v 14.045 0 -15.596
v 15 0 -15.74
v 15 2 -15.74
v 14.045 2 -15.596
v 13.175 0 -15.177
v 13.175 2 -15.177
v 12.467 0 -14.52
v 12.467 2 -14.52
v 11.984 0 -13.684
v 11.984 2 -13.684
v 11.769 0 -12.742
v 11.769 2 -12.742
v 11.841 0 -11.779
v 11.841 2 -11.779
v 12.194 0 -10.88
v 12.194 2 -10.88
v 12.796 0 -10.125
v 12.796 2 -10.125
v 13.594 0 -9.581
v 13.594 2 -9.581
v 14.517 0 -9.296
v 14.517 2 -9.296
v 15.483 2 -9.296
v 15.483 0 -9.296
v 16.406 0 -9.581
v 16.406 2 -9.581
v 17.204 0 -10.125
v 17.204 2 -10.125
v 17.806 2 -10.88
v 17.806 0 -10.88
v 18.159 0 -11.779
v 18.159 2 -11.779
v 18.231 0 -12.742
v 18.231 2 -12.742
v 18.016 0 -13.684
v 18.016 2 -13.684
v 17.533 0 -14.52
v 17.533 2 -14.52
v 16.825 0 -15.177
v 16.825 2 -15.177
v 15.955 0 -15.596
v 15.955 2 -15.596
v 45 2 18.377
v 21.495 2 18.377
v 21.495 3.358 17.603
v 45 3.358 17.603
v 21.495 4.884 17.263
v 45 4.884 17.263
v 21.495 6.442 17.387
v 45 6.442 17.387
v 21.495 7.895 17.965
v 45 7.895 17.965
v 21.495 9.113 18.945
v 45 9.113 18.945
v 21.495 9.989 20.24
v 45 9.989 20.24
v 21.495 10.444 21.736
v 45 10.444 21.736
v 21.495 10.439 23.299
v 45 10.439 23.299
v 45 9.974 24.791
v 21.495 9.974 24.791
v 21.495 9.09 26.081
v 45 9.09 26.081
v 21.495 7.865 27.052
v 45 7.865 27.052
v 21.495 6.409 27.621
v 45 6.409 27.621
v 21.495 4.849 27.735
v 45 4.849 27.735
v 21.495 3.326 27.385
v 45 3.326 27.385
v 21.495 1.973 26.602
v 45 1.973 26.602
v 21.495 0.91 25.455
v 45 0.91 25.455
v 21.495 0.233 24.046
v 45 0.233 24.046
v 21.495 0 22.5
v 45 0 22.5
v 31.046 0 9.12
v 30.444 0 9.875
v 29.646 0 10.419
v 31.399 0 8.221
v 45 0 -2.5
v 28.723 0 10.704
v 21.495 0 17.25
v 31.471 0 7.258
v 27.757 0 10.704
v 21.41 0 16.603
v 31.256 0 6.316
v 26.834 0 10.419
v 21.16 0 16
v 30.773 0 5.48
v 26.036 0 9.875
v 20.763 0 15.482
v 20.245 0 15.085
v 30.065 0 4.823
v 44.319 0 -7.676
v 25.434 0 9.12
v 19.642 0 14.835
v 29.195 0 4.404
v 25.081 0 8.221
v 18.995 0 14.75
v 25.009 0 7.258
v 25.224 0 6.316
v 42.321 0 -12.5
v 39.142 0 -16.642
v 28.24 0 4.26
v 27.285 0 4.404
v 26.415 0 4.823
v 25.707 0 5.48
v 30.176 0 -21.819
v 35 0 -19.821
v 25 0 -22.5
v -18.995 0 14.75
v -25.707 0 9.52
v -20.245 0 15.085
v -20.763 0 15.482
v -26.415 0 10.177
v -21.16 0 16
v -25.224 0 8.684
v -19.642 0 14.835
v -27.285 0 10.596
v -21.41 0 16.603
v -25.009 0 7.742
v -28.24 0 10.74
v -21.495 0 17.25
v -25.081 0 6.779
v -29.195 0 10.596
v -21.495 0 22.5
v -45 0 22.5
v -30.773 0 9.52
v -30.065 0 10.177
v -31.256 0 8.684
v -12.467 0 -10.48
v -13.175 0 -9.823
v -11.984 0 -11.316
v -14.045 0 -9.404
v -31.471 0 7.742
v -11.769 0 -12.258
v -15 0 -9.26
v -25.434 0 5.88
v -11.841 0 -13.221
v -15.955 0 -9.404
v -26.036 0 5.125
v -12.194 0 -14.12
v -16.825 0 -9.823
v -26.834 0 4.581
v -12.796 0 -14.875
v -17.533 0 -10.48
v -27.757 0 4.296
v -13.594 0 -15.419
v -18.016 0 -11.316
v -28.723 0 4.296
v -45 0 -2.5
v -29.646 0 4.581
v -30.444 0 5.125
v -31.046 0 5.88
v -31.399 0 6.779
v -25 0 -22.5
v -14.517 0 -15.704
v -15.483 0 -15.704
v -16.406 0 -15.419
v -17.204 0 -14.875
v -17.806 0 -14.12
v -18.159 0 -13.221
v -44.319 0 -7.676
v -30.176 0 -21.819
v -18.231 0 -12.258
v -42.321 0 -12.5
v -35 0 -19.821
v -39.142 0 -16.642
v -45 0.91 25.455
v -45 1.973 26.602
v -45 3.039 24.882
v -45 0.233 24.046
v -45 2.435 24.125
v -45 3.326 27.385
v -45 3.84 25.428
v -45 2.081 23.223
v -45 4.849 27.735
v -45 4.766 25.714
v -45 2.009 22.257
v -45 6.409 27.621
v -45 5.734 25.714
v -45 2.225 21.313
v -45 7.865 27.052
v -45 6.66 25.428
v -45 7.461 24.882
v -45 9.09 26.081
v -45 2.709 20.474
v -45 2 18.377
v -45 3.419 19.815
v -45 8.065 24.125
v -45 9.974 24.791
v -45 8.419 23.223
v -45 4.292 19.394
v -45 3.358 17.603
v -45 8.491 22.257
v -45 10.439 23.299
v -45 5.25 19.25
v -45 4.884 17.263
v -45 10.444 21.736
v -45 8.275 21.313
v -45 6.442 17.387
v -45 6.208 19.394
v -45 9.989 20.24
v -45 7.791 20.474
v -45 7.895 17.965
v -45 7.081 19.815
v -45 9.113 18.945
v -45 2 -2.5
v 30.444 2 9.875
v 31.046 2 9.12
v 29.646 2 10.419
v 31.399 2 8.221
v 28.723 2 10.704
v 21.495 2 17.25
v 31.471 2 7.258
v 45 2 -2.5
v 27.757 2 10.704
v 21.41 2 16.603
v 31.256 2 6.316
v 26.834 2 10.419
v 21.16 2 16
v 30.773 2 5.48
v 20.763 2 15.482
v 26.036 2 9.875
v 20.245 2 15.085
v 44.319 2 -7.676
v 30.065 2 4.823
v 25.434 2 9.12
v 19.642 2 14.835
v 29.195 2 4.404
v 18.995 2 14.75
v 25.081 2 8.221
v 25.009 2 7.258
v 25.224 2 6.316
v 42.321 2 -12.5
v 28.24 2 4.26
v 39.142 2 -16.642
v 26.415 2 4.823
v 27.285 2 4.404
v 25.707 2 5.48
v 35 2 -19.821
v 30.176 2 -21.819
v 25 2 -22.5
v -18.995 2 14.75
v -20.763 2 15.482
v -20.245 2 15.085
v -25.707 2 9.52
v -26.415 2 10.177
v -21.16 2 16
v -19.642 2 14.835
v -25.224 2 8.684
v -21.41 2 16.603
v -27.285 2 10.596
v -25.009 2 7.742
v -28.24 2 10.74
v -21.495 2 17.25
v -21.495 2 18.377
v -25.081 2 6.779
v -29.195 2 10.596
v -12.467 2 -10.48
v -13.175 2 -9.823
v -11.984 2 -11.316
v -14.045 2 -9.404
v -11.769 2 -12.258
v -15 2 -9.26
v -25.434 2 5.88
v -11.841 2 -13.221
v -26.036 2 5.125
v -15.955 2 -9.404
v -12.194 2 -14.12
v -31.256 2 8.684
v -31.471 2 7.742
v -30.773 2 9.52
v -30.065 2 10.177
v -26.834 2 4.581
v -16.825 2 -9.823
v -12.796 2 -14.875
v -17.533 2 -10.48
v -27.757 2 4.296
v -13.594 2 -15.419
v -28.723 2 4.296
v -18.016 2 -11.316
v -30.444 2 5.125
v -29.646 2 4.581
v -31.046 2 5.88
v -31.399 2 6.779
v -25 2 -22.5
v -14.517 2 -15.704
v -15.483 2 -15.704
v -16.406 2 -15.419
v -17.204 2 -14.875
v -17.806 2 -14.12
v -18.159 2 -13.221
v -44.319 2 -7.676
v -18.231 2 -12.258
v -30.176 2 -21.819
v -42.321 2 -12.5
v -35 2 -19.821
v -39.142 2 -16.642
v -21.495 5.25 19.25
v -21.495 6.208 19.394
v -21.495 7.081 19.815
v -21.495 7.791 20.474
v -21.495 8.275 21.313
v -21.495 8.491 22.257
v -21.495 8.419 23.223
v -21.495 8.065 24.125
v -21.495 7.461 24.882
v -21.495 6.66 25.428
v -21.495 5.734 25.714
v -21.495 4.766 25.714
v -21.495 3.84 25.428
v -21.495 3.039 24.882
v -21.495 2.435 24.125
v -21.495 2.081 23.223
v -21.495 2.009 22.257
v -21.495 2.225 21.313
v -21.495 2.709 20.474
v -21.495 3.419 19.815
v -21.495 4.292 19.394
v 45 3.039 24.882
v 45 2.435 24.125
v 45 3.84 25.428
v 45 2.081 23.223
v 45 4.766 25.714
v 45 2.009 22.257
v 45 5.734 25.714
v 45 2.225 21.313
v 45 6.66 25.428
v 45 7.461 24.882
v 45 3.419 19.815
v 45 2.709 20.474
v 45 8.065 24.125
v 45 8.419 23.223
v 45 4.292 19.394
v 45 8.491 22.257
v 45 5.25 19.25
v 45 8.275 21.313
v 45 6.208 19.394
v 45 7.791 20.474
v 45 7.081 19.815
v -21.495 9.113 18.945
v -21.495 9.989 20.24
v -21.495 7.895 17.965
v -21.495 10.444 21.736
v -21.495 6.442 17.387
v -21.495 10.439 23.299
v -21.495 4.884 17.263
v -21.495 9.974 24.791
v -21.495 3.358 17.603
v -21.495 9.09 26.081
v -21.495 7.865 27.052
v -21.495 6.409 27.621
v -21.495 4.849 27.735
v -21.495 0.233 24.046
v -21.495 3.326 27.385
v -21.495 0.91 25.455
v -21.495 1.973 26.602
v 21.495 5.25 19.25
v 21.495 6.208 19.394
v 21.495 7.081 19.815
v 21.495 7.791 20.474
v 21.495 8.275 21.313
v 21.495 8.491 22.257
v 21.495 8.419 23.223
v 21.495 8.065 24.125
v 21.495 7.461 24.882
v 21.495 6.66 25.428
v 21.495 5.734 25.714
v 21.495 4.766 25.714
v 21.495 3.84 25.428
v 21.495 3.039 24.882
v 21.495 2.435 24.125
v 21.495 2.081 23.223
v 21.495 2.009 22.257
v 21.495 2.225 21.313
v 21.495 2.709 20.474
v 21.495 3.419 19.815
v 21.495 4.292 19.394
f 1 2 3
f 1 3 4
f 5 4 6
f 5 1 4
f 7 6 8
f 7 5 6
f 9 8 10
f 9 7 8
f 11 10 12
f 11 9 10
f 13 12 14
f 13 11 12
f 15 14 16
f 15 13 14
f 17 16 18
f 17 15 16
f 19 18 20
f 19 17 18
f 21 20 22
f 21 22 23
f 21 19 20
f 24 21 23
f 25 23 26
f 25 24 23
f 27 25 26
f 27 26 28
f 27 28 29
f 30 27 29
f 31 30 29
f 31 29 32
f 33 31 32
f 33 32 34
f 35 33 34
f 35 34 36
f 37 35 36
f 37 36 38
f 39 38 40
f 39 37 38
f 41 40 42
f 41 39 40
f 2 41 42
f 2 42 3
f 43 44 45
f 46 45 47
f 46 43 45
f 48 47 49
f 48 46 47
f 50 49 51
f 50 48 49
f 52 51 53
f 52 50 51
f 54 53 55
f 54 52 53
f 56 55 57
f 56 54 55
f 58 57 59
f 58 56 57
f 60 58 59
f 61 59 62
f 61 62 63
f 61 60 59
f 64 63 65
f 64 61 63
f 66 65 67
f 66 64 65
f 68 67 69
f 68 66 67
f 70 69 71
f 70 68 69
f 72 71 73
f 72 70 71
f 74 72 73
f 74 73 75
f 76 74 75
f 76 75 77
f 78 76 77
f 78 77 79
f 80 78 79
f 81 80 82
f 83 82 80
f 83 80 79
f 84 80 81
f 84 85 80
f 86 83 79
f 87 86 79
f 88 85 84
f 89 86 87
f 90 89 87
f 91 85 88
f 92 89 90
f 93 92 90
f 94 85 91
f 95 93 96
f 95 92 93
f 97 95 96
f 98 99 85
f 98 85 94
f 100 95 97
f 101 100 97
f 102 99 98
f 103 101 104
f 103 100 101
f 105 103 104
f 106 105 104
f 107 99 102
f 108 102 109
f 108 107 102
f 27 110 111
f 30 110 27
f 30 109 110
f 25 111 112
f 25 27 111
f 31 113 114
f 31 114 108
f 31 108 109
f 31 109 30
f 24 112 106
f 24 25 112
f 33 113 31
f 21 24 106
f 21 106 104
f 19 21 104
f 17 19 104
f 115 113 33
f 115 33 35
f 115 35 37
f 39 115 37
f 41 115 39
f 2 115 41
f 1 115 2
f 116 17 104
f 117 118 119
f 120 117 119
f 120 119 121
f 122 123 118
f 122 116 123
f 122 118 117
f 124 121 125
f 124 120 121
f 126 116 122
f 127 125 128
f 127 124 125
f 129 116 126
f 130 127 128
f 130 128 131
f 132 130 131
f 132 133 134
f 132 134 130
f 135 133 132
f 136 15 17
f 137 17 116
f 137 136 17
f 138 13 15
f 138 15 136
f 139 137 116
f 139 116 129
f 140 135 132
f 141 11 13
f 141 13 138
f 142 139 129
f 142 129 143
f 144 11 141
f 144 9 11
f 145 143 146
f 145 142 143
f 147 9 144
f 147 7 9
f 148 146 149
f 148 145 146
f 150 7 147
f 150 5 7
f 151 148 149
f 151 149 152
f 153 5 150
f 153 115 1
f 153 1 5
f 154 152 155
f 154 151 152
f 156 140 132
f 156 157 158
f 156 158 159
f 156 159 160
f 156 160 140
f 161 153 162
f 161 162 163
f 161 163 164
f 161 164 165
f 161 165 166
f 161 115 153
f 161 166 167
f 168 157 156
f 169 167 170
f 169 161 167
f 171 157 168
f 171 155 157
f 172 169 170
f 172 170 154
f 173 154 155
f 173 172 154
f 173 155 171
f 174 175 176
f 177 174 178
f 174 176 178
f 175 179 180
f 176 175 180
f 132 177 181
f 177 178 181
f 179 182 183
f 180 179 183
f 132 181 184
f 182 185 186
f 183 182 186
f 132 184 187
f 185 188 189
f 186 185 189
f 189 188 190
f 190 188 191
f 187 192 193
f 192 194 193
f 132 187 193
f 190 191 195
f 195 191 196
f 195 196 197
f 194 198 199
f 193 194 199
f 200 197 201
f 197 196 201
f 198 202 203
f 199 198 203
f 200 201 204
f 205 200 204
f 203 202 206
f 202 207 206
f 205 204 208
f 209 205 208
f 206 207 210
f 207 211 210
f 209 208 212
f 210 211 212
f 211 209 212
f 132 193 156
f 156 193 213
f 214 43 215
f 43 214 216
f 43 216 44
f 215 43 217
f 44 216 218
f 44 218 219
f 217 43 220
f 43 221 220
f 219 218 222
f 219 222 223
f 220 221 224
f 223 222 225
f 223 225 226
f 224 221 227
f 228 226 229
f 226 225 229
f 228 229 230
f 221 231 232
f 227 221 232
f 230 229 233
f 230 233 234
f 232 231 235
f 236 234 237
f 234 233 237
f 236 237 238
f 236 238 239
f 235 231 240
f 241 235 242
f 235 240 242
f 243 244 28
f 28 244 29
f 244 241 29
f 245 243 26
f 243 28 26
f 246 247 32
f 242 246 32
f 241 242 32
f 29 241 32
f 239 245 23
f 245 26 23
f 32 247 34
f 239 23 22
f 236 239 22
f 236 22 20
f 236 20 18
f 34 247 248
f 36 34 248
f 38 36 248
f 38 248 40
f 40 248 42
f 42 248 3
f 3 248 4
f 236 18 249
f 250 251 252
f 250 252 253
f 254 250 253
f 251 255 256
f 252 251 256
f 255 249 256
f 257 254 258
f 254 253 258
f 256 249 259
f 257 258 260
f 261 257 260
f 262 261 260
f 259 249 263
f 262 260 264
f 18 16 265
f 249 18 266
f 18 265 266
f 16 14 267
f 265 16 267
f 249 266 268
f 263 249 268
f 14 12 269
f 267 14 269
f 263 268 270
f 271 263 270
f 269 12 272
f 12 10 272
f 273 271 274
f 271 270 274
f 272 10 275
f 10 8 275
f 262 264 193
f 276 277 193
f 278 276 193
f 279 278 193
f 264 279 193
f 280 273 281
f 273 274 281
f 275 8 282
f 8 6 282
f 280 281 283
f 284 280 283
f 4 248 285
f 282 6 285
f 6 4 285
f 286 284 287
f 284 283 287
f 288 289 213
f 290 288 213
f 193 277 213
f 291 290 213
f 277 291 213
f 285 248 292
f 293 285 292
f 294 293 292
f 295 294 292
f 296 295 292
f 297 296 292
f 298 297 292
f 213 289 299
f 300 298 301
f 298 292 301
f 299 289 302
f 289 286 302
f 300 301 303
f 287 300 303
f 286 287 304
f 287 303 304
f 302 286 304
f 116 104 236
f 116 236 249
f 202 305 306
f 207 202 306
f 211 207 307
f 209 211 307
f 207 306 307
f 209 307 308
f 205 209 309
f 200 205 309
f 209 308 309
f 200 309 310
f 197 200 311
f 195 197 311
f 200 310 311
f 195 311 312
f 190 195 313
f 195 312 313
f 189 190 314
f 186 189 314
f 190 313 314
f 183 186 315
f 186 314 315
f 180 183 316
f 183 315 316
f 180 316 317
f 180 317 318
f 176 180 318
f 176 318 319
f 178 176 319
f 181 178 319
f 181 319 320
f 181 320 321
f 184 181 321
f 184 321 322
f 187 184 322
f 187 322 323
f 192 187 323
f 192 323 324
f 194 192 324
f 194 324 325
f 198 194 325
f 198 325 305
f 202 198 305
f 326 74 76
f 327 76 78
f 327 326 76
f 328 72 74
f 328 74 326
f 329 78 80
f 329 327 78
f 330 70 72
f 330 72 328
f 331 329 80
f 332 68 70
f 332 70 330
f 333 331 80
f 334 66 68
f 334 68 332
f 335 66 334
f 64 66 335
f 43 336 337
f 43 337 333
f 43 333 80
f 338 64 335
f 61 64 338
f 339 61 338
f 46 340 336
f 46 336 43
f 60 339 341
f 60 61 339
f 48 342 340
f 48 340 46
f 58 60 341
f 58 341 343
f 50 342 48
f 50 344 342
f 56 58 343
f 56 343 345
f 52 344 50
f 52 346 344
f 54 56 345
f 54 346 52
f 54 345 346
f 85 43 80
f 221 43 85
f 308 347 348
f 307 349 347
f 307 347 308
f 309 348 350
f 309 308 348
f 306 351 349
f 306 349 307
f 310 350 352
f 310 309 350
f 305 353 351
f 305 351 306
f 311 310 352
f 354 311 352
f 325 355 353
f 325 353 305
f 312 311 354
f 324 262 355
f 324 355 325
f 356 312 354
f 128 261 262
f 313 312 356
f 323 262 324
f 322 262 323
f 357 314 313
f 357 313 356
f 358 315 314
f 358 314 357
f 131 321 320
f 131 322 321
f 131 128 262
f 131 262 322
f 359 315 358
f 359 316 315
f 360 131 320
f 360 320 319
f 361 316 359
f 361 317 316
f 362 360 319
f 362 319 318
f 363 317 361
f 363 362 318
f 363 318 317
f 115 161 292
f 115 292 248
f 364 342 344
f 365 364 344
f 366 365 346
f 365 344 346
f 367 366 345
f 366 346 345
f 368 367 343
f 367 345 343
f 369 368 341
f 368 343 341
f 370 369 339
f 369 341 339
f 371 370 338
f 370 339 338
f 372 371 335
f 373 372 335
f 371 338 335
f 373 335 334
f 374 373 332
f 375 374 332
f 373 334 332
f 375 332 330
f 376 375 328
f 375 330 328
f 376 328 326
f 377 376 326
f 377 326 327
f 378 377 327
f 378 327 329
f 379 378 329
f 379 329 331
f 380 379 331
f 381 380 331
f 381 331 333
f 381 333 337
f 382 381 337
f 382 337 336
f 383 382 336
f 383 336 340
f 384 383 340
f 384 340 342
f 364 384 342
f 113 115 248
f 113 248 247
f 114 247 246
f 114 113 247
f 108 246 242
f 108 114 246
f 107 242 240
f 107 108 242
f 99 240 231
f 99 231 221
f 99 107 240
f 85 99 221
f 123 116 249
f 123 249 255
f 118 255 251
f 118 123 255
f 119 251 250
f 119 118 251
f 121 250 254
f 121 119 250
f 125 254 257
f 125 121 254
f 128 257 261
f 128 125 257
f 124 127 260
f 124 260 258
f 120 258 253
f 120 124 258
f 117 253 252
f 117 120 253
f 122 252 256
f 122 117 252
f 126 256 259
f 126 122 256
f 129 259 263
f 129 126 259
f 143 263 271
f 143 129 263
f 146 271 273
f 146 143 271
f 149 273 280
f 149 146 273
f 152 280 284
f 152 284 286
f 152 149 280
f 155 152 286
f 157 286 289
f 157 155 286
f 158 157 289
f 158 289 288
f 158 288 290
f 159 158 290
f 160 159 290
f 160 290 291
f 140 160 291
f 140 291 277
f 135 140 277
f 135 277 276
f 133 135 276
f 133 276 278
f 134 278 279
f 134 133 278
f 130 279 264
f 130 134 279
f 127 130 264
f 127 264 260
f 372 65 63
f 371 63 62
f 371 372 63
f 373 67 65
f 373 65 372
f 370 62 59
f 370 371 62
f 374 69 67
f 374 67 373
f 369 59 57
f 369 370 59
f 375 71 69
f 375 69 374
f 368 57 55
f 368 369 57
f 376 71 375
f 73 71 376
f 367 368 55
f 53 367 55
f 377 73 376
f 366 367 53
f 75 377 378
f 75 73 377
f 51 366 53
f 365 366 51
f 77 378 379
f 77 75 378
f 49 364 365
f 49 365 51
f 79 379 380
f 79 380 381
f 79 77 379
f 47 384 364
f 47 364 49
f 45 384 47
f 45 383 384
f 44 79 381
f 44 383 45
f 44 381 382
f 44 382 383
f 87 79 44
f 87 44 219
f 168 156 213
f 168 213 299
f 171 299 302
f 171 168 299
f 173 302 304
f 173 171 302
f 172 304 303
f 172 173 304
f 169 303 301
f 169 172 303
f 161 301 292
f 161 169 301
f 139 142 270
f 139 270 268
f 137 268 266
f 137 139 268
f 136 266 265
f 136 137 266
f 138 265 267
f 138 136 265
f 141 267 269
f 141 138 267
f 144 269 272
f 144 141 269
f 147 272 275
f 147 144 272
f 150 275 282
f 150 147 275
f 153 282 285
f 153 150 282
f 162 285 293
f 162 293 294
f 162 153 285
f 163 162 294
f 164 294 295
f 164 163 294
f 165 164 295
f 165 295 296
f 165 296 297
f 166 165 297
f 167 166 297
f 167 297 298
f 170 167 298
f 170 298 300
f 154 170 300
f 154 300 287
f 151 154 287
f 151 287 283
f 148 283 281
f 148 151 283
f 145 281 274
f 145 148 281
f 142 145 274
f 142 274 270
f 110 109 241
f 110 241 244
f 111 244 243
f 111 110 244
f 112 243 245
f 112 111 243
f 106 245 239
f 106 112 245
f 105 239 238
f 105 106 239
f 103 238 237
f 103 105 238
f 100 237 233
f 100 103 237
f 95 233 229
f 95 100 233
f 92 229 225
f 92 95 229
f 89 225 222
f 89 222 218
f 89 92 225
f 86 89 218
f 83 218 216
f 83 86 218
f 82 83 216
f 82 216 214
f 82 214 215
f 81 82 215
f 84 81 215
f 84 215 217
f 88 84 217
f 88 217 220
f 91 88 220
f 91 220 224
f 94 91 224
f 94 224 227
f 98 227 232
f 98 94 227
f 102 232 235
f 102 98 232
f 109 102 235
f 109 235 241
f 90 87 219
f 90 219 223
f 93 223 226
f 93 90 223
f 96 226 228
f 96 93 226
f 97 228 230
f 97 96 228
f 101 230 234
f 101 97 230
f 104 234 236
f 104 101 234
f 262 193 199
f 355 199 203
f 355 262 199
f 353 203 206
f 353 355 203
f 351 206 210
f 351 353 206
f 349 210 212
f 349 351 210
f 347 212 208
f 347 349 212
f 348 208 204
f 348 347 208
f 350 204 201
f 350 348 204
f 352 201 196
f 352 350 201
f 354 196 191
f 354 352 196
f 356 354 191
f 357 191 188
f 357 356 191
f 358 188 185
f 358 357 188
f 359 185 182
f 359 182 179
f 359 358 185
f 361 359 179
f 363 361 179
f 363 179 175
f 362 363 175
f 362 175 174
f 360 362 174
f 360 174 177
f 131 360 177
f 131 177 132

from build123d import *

# Parameters (mm, degrees)
SKETCH_1_R               = 3.24
EXTRUDE_1_DEPTH          = 2
SKETCH_2_R               = 5.25
SKETCH_2_R_2             = 3.25
EXTRUDE_2_DEPTH          = 90
CUT_EXTRUDE_1_DEPTH      = 54.547292182
CUT_EXTRUDE_1_DEPTH_BACK = 54.547292182


with BuildPart() as part:
    # Эскиз1 → Бобышка-Вытянуть1 (new body)
    with BuildSketch(Plane(origin=(0, 0, 0), x_dir=(1, 0, 0), z_dir=(0, 1, 0))):
        with BuildLine():
            Line((-25, 22.5), (25, 22.5))
            ThreePointArc((25, 22.5), (39.142135624, 16.642135624), (45, 2.5))
            Line((45, 2.5), (45, -22.5))
            Line((45, -22.5), (-45, -22.5))
            Line((-45, -22.5), (-45, 2.5))
            ThreePointArc((-45, 2.5), (-39.142135624, 16.642135624), (-25, 22.5))
        make_face()
        with Locations(Location((-28.24, -7.5, 0), (0, 0, 270))):
            Circle(SKETCH_1_R, mode=Mode.SUBTRACT)
        with Locations(Location((-15, 12.5, 0), (0, 0, 270))):
            Circle(SKETCH_1_R, mode=Mode.SUBTRACT)
        with Locations(Location((15, 12.5, 0), (0, 0, 90))):
            Circle(SKETCH_1_R, mode=Mode.SUBTRACT)
        with Locations(Location((28.24, -7.5, 0), (0, 0, 90))):
            Circle(SKETCH_1_R, mode=Mode.SUBTRACT)
    extrude(amount=EXTRUDE_1_DEPTH)

    # Эскиз2 → Бобышка-Вытянуть2 (add)
    with BuildSketch(Plane(origin=(45, 0, 0), x_dir=(0, 0, -1), z_dir=(1, 0, 0))):
        with Locations((-22.5, 5.25)):
            Circle(SKETCH_2_R)
        with Locations((-22.5, 5.25)):
            Circle(SKETCH_2_R_2, mode=Mode.SUBTRACT)
    extrude(amount=-EXTRUDE_2_DEPTH)

    # Эскиз3 → Вырез-Вытянуть1 (cut, two sides: drawn at the far end of the back side and taken through both)
    with BuildSketch(Plane(origin=(0, 2, 0), x_dir=(1, 0, 0), z_dir=(0, 1, 0)).offset(-CUT_EXTRUDE_1_DEPTH_BACK)):
        with BuildLine():
            Line((-21.495, -40.75), (21.495, -40.75))
            Line((21.495, -40.75), (21.495, -17.25))
            ThreePointArc((21.495, -17.25), (20.762766953, -15.482233047), (18.995, -14.75))
            Line((18.995, -14.75), (-18.995, -14.75))
            ThreePointArc((-18.995, -14.75), (-20.762766953, -15.482233047), (-21.495, -17.25))
            Line((-21.495, -17.25), (-21.495, -40.75))
        make_face()
    extrude(amount=CUT_EXTRUDE_1_DEPTH + CUT_EXTRUDE_1_DEPTH_BACK, mode=Mode.SUBTRACT)


solid = part.part
